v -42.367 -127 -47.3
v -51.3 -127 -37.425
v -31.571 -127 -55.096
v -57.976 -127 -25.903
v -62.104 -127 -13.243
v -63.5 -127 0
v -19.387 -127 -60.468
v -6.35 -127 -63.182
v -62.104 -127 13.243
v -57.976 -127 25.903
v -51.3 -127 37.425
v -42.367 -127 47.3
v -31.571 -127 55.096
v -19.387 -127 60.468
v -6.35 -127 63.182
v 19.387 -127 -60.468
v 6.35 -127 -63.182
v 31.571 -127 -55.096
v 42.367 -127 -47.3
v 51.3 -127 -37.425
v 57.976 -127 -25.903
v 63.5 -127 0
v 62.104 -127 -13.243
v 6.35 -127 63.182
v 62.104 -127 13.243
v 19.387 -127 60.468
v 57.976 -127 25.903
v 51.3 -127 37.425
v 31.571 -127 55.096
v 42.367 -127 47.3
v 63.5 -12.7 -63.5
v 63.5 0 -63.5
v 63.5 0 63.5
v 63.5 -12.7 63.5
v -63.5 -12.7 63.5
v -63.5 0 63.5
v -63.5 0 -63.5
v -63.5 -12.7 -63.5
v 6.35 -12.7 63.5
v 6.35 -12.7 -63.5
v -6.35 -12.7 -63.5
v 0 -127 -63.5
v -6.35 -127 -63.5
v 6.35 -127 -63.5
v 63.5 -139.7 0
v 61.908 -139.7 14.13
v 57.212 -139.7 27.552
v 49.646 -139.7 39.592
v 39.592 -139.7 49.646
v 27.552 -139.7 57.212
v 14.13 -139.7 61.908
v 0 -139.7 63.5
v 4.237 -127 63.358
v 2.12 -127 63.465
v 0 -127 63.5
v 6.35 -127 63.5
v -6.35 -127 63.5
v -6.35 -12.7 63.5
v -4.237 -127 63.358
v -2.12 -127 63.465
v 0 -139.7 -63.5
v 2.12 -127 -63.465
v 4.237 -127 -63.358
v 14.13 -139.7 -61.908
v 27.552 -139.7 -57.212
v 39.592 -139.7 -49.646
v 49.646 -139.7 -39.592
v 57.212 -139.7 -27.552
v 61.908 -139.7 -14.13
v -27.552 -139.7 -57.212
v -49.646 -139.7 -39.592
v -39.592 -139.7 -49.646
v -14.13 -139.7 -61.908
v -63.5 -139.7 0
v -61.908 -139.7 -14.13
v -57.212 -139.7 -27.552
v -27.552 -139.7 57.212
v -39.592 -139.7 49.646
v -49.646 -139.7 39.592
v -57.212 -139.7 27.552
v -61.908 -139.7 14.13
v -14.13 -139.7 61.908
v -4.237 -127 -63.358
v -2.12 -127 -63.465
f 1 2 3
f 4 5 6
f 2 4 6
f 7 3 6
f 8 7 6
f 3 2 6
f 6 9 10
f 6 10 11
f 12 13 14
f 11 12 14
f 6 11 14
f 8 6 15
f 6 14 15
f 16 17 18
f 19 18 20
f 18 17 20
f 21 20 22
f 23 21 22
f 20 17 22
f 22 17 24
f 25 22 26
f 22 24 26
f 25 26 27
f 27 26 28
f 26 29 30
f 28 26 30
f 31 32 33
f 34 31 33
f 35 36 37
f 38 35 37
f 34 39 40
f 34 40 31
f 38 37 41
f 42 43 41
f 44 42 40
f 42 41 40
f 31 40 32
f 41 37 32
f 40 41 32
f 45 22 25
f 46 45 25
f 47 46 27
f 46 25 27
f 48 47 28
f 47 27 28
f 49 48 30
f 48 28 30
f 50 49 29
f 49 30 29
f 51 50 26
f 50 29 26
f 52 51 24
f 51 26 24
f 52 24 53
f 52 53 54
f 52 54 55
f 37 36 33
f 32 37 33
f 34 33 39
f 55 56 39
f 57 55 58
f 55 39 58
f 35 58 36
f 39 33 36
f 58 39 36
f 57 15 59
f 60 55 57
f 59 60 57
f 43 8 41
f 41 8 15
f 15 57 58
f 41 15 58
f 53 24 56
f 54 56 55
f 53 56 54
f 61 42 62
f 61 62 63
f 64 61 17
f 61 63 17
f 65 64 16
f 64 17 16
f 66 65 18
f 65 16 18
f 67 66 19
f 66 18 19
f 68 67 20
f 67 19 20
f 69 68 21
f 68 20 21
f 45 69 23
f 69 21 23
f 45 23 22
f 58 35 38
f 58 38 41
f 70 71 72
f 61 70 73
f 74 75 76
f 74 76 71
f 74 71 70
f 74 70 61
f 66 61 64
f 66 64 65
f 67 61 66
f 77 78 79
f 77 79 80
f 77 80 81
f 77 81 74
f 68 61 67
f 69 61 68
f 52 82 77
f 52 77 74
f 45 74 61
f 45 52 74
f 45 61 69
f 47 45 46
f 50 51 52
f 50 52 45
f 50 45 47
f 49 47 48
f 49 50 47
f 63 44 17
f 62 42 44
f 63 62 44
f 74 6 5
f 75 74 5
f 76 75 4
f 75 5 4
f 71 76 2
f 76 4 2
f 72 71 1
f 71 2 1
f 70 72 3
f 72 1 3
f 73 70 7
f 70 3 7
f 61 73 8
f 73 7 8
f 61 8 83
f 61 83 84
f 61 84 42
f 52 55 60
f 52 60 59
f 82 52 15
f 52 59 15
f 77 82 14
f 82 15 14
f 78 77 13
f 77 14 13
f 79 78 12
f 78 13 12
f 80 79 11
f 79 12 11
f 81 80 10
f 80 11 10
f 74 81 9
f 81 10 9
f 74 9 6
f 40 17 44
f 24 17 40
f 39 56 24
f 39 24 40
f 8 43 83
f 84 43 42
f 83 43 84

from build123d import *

# Parameters (mm, degrees)
F3_W     = 127
F3_H     = 127
F4_DEPTH = 6.35
F5_DEPTH = 12.7
F0_W     = 63.5
F0_H     = 63.5
F6_DEPTH = 12.7


with BuildPart() as f4:
    # F3 (on Right) → F4 (new body, symmetric)
    with BuildSketch(Plane.YZ):
        with Locations((-63.5, 0)):
            Rectangle(F3_W, F3_H)
    extrude(amount=F4_DEPTH, both=True)

    # F2 (on offset) → F5 (join)
    with BuildSketch(Plane.XZ.offset(127)):
        with BuildLine():
            ThreePointArc((-63.5, 0), (-44.901281, -44.901281), (0, -63.5))
            Line((0, -63.5), (0, 0))
            Line((0, 0), (-63.5, 0))
        make_face()
        with BuildLine():
            ThreePointArc((0, -63.5), (44.901281, -44.901281), (63.5, 0))
            Line((63.5, 0), (0, 0))
            Line((0, 0), (0, -63.5))
        make_face()
        with BuildLine():
            Line((0, 0), (0, 63.5))
            ThreePointArc((0, 63.5), (-44.901281, 44.901281), (-63.5, 0))
            Line((-63.5, 0), (0, 0))
        make_face()
        with BuildLine():
            Line((0, 0), (63.5, 0))
            ThreePointArc((63.5, 0), (44.901281, 44.901281), (0, 63.5))
            Line((0, 63.5), (0, 0))
        make_face()
    extrude(amount=F5_DEPTH)

    # F0 (on Front) → F6 (join)
    with BuildSketch(Plane.XZ):
        with Locations((-31.75, 31.75)):
            Rectangle(F0_W, F0_H)
        with Locations((31.75, 31.75)):
            Rectangle(F0_W, F0_H)
        with Locations((31.75, -31.75)):
            Rectangle(F0_W, F0_H)
        with Locations((-31.75, -31.75)):
            Rectangle(F0_W, F0_H)
    extrude(amount=F6_DEPTH)


solid = f4.part
